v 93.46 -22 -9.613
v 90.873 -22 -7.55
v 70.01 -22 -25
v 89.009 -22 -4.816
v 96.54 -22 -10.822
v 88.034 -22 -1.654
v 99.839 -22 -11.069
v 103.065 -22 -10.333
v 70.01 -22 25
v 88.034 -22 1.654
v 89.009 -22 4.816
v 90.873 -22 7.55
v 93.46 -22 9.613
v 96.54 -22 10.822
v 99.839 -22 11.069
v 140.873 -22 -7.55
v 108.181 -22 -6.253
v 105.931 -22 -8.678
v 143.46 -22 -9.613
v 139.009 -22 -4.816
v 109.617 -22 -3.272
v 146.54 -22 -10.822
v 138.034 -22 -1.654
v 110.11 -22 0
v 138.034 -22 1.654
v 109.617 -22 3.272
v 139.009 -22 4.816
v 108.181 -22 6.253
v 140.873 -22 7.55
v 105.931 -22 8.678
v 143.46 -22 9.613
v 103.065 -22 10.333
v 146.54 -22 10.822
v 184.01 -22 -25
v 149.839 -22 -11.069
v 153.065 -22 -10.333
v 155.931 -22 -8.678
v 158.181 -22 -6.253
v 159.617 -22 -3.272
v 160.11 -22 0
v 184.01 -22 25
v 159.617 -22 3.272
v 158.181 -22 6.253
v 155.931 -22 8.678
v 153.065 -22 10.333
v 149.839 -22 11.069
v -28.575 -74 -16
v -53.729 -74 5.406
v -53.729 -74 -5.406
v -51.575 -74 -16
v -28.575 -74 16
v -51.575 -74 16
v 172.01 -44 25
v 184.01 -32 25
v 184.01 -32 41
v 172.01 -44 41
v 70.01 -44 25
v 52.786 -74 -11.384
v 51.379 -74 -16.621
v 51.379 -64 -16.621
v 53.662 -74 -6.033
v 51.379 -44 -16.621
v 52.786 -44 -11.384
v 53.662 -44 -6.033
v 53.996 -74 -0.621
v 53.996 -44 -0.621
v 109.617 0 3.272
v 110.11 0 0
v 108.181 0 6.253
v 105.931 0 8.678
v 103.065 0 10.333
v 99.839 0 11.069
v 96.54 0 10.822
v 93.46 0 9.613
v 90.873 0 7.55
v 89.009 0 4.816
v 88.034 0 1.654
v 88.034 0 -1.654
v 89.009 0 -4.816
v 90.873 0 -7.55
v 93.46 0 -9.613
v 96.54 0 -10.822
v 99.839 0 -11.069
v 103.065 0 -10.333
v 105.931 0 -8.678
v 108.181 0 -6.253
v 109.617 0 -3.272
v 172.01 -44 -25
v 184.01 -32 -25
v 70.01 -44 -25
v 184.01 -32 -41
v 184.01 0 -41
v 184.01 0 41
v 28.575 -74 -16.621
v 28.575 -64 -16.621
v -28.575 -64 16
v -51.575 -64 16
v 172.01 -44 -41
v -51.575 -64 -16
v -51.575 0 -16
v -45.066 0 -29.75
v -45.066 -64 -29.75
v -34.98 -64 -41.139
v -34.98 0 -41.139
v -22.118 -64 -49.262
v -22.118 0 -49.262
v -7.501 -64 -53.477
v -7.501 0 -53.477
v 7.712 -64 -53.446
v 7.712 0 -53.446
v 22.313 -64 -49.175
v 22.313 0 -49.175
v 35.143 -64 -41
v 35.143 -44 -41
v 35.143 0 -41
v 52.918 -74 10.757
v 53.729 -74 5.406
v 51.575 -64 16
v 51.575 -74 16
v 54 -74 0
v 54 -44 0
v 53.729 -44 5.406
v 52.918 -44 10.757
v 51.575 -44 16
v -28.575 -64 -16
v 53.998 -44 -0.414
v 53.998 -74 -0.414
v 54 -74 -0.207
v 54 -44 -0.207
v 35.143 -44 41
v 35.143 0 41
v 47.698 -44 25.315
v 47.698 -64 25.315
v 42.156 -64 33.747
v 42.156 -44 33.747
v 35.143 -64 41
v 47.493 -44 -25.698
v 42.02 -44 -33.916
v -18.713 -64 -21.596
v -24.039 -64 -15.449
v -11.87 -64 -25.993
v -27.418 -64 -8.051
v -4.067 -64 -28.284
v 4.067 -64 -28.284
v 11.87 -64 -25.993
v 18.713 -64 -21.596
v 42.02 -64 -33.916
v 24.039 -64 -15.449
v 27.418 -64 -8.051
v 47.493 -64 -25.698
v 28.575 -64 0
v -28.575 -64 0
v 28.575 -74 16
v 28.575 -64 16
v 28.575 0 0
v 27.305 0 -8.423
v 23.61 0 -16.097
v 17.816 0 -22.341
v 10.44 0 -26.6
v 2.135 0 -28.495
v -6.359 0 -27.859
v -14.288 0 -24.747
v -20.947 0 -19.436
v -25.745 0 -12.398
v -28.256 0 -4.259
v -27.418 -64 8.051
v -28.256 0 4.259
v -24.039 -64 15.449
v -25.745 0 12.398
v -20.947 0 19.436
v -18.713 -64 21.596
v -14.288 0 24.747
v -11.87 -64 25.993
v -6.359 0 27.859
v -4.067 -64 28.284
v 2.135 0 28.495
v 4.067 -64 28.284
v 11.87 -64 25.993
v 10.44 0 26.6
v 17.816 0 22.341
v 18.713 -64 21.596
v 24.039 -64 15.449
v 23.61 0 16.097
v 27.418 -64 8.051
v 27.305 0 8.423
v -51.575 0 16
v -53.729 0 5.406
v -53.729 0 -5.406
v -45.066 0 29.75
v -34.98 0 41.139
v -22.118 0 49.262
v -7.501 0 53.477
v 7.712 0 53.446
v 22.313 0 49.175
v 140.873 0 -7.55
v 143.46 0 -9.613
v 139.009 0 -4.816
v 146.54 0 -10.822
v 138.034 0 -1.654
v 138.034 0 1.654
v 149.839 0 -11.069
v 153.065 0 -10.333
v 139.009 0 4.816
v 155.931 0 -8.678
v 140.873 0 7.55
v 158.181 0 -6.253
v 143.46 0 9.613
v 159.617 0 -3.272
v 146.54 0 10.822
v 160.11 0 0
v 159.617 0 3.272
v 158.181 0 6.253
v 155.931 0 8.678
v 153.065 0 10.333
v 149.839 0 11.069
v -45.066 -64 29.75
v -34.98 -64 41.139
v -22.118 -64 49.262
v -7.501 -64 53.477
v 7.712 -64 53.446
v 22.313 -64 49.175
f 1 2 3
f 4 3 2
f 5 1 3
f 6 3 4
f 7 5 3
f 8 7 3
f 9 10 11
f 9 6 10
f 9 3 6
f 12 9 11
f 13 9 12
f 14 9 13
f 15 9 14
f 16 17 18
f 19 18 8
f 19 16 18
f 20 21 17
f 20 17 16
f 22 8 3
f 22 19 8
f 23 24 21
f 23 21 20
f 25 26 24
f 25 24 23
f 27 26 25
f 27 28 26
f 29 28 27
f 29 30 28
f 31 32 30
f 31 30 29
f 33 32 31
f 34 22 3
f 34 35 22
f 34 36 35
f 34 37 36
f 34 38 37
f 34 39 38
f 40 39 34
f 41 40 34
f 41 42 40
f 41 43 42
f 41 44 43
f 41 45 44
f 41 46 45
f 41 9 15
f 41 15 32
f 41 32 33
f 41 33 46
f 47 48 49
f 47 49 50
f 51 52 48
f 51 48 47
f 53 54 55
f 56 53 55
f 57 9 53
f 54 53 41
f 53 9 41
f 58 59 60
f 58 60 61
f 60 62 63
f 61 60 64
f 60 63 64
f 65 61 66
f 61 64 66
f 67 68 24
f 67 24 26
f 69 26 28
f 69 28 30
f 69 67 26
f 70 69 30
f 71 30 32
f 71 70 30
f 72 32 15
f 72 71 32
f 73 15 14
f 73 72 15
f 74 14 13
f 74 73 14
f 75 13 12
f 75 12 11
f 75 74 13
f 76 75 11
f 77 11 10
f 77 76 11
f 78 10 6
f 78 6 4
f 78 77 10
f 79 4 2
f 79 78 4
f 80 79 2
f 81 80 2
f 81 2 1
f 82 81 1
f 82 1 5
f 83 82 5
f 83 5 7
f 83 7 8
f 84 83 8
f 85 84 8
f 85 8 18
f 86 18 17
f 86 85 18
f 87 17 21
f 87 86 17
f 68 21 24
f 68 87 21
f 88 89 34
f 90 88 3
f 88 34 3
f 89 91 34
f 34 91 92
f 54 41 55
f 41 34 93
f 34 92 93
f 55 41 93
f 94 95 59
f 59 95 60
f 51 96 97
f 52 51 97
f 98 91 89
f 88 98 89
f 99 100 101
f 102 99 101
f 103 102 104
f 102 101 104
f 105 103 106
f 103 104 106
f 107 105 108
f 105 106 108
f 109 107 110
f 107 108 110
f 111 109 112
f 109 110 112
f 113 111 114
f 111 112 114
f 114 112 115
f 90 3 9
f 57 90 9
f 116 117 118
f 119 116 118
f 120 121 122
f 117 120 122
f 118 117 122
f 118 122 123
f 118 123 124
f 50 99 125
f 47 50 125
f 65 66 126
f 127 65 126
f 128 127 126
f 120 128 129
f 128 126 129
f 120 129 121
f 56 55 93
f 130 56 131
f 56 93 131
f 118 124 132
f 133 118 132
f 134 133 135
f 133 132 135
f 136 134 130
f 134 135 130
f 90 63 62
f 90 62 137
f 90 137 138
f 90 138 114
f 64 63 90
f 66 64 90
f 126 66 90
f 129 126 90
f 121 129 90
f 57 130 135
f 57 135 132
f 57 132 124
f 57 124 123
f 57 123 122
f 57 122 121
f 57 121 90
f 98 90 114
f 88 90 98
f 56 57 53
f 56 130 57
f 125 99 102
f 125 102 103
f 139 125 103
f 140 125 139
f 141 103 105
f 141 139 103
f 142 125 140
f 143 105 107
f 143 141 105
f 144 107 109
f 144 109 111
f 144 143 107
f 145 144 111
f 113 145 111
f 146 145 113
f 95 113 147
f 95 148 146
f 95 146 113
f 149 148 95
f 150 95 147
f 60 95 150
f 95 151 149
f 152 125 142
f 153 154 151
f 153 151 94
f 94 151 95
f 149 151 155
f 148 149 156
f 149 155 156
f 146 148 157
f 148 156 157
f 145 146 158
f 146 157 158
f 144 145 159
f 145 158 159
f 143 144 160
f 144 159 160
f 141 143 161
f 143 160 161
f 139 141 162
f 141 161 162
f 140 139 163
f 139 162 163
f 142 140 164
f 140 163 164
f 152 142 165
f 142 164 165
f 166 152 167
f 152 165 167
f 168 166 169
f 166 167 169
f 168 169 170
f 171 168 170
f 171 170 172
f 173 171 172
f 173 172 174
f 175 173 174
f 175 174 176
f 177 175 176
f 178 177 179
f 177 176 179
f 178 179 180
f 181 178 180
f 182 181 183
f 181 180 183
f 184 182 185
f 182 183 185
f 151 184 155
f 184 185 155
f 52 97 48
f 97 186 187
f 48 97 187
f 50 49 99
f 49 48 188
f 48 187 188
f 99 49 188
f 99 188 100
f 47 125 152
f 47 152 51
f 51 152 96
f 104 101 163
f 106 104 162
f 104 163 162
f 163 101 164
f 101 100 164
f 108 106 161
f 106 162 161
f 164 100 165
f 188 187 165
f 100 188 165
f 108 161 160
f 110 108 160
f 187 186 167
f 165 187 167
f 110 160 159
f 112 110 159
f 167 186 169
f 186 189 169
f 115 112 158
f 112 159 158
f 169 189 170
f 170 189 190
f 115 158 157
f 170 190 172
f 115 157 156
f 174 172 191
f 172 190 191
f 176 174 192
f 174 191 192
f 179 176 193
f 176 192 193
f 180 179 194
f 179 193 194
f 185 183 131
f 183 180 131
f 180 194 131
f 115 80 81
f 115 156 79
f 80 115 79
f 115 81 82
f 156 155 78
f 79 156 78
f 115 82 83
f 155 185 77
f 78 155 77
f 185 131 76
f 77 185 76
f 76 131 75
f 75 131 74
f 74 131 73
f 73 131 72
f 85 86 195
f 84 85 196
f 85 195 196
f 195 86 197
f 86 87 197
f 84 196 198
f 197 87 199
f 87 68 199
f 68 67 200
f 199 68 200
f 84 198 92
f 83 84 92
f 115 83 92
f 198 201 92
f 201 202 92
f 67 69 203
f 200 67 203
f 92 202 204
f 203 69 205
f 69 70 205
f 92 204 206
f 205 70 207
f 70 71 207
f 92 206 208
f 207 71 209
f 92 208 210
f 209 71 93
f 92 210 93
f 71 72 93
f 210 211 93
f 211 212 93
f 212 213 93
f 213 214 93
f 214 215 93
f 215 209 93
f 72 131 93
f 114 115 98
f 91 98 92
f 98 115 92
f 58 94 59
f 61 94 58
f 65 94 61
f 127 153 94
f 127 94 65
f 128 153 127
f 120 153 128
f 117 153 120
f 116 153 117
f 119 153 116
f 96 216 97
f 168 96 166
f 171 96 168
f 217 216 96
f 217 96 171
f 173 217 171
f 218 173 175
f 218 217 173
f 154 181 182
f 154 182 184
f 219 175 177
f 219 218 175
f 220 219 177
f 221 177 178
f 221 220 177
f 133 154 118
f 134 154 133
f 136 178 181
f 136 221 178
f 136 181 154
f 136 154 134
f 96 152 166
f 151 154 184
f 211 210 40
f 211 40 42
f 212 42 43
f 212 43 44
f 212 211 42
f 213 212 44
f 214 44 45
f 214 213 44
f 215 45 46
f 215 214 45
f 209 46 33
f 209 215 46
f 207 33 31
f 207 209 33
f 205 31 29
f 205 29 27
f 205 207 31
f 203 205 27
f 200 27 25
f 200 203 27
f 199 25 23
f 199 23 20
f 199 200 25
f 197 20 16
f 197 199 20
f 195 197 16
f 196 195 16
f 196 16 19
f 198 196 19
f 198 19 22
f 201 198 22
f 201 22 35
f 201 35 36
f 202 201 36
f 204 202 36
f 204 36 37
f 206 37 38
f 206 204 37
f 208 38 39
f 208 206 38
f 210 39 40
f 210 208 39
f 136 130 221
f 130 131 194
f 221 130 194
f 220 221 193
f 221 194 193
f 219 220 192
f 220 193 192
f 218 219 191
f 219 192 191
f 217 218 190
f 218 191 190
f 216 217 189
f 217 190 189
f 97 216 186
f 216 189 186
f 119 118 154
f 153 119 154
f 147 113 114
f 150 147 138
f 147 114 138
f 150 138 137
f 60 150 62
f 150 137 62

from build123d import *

# Parameters (mm, degrees)
F0_R     = 11.1
F1_DEPTH = 22
F2_DEPTH = 44
F3_DEPTH = 64
F4_DEPTH = 74
F5_SIZE  = 12


with BuildPart() as f1:
    # F0 (on Front) → F1 (new body)
    with BuildSketch(Plane.XZ):
        Polygon((184.0099021196, -25), (184.0099021196, 25), (70.0099021196, 25), (70.0099021196, 0), (70.0099021196, -25), align=None)
        with Locations((99.0099021196, 0)):
            Circle(F0_R, mode=Mode.SUBTRACT)
        with Locations((149.0099021196, 0)):
            Circle(F0_R, mode=Mode.SUBTRACT)
    extrude(amount=F1_DEPTH)

    # F0 (on Front) → F2 (join)
    with BuildSketch(Plane.XZ):
        with BuildLine():
            ThreePointArc((51.5751878329, 16), (53.3903556037, 8.0913489921), (54, 0))
            ThreePointArc((54, 0), (53.9991081797, -0.3103478577), (53.9964327484, -0.6206854644))
            ThreePointArc((53.9964327484, -0.6206854644), (53.2913728634, -8.7194941557), (51.3785248396, -16.6206854644))
            ThreePointArc((51.3785248396, -16.6206854644), (44.9451061645, -29.9322139486), (35.1425667816, -41))
            Line((35.1425667816, -41), (184.0099021196, -41))
            Line((184.0099021196, -41), (184.0099021196, -25))
            Line((184.0099021196, -25), (70.0099021196, -25))
            Line((70.0099021196, -25), (70.0099021196, 0))
            Line((70.0099021196, 0), (70.0099021196, 25))
            Line((70.0099021196, 25), (184.0099021196, 25))
            Line((184.0099021196, 25), (184.0099021196, 41))
            Line((184.0099021196, 41), (35.1425667816, 41))
            ThreePointArc((35.1425667816, 41), (45.1247409006, 29.6607106903), (51.5751878329, 16))
        make_face()
    extrude(amount=F2_DEPTH)

    # F0 (on Front) → F3 (join)
    with BuildSketch(Plane.XZ):
        with BuildLine():
            Line((28.575, 16), (51.5751878329, 16))
            ThreePointArc((51.5751878329, 16), (45.1247409006, 29.6607106903), (35.1425667816, 41))
            ThreePointArc((35.1425667816, 41), (-14.9585346426, 51.8868214612), (-51.5751878329, 16))
            Line((-51.5751878329, 16), (-28.575, 16))
            Line((-28.575, 16), (-28.575, 0))
            ThreePointArc((-28.575, 0), (0, 28.575), (28.575, 0))
            Line((28.575, 0), (28.575, 16))
        make_face()
        with BuildLine():
            ThreePointArc((35.1425667816, -41), (44.9451061645, -29.9322139486), (51.3785248396, -16.6206854644))
            Line((51.3785248396, -16.6206854644), (28.575, -16.6206854644))
            Line((28.575, -16.6206854644), (28.575, -0.6206854644))
            Line((28.575, -0.6206854644), (28.575, 0))
            ThreePointArc((28.575, 0), (0, -28.575), (-28.575, 0))
            Line((-28.575, 0), (-28.575, -16))
            Line((-28.575, -16), (-51.5751878329, -16))
            ThreePointArc((-51.5751878329, -16), (-14.9585346426, -51.8868214612), (35.1425667816, -41))
        make_face()
    extrude(amount=F3_DEPTH)

    # F0 (on Front) → F4 (join)
    with BuildSketch(Plane.XZ):
        with BuildLine():
            ThreePointArc((53.9964327484, -0.6206854644), (53.9991081797, -0.3103478577), (54, 0))
            ThreePointArc((54, 0), (53.3903556037, 8.0913489921), (51.5751878329, 16))
            Line((51.5751878329, 16), (28.575, 16))
            Line((28.575, 16), (28.575, 0))
            Line((28.575, 0), (28.575, -0.6206854644))
            Line((28.575, -0.6206854644), (28.575, -16.6206854644))
            Line((28.575, -16.6206854644), (51.3785248396, -16.6206854644))
            ThreePointArc((51.3785248396, -16.6206854644), (53.2913728634, -8.7194941557), (53.9964327484, -0.6206854644))
        make_face()
        with BuildLine():
            Line((-28.575, 16), (-51.5751878329, 16))
            ThreePointArc((-51.5751878329, 16), (-54, 0), (-51.5751878329, -16))
            Line((-51.5751878329, -16), (-28.575, -16))
            Line((-28.575, -16), (-28.575, 0))
            Line((-28.575, 0), (-28.575, 16))
        make_face()
    extrude(amount=F4_DEPTH)

    # F5
    f5_edges = [f1.edges().sort_by_distance(p)[0] for p in [
        (184.009902, -44, 33),
        (184.009902, -44, -33),
    ]]
    chamfer(f5_edges, length=F5_SIZE)


solid = f1.part
